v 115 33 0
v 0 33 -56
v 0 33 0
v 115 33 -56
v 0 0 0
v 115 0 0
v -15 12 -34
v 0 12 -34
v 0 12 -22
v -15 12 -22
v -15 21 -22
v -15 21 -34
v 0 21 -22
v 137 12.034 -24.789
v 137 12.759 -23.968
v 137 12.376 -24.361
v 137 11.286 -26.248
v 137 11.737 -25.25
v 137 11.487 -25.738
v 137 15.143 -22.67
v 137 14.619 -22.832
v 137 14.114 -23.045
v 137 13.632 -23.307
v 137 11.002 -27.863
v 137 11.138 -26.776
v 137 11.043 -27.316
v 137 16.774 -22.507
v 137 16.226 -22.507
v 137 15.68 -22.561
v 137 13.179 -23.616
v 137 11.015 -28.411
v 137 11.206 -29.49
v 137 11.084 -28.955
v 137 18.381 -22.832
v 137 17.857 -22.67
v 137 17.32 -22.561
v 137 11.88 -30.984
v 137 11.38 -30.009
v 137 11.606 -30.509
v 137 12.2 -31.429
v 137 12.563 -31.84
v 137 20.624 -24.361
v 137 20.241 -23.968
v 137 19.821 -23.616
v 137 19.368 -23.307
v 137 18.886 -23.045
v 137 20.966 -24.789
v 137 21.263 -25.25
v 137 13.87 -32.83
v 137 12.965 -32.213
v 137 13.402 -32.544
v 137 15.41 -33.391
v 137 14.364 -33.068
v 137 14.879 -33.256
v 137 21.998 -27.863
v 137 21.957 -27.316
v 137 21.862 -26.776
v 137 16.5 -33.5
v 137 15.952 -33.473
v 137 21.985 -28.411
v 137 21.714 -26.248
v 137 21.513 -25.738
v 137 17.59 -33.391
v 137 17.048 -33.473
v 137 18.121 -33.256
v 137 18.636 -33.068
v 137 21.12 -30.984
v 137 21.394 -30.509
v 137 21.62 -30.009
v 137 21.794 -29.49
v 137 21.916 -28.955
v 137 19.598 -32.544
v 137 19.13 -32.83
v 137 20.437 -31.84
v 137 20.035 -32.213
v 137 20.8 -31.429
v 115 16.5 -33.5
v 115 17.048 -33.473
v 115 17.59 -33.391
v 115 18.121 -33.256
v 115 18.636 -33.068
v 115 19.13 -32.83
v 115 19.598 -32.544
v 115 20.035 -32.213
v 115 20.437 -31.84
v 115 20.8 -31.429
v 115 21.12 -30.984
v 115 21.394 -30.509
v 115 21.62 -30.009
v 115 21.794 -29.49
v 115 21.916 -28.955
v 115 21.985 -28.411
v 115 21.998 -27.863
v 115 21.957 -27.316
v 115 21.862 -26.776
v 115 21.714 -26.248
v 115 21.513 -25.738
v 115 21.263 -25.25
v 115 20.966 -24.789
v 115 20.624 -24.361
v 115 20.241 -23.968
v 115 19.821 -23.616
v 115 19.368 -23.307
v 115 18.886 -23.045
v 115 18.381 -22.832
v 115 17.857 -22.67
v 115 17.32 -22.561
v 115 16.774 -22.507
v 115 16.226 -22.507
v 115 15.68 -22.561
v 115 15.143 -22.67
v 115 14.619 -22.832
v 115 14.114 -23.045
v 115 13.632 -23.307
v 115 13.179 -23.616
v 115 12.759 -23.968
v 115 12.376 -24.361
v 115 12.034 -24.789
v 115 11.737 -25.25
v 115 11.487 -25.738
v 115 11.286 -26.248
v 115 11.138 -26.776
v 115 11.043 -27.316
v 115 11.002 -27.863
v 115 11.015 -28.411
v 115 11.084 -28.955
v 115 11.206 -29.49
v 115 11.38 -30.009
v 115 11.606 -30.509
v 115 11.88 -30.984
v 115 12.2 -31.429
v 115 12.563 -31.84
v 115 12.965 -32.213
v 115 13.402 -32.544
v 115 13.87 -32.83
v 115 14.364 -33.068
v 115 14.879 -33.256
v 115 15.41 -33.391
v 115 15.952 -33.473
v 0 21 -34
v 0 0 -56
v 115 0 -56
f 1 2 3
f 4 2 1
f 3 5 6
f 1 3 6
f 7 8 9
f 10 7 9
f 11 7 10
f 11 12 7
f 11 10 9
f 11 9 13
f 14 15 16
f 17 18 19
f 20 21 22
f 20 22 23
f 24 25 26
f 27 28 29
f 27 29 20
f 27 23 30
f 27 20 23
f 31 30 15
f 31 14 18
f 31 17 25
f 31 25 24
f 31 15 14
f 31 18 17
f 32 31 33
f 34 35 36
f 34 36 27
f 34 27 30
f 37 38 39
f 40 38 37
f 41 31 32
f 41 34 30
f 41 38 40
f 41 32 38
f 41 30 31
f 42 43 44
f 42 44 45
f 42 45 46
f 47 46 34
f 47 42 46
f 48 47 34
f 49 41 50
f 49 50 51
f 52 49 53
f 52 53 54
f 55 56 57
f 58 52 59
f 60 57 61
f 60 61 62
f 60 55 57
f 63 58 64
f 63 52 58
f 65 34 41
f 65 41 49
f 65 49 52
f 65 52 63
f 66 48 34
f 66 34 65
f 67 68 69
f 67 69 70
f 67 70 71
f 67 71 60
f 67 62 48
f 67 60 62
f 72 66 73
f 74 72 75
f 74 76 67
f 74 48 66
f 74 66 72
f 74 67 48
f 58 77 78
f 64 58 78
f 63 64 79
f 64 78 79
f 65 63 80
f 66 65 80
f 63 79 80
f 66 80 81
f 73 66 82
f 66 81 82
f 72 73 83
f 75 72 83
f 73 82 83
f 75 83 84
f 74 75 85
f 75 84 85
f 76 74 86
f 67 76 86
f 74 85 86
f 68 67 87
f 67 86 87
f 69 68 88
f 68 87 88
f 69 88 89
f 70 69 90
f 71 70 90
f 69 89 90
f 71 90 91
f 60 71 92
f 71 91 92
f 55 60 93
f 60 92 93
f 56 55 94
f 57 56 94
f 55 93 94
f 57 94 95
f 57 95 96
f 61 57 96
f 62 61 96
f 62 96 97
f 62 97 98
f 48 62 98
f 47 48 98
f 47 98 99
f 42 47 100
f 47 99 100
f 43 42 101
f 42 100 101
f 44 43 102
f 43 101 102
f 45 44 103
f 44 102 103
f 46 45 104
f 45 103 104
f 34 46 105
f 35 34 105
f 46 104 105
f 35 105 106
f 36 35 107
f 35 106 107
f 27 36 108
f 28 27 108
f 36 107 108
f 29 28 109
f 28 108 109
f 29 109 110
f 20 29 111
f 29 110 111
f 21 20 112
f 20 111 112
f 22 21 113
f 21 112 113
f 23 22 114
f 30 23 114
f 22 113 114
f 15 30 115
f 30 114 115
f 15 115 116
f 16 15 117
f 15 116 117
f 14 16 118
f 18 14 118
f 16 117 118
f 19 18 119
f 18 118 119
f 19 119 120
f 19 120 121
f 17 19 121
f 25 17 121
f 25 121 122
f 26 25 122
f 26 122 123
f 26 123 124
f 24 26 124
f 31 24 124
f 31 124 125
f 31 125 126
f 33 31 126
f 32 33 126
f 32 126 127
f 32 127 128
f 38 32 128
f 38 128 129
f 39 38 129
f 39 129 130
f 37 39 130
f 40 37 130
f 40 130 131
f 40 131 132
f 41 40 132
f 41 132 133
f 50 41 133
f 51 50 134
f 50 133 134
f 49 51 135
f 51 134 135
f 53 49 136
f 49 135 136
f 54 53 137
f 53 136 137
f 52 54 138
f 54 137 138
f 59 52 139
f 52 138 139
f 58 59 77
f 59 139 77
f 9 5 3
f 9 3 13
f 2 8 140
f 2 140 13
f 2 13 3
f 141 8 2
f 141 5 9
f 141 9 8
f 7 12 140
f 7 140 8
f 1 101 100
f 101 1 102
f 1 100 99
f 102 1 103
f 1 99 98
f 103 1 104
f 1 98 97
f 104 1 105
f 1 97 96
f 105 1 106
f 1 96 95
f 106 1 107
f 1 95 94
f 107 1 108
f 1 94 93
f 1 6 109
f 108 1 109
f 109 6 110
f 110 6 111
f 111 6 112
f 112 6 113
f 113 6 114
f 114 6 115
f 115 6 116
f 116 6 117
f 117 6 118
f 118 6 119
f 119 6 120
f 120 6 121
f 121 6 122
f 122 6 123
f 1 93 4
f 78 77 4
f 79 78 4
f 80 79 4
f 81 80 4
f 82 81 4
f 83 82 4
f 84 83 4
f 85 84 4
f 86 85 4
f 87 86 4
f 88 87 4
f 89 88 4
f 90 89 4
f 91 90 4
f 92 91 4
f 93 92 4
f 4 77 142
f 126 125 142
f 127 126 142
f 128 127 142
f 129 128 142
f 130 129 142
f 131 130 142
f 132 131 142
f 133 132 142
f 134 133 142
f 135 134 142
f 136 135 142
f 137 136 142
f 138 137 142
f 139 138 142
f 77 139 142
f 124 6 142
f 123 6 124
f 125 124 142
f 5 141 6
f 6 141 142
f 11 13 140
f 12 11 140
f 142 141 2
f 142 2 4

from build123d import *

# Parameters (mm, degrees)
SZKIC1_W                    = 115
SZKIC1_H                    = 56
DODANIE_WYCI_GNI_CIE1_DEPTH = 33
SZKIC2_R                    = 5.5
DODANIE_WYCI_GNI_CIE2_DEPTH = 22
DODANIE_WYCI_GNI_CIE3_DEPTH = 15


with BuildPart() as part:
    # Szkic1 → Dodanie-wyciągnięcie1 (new body)
    with BuildSketch(Plane(origin=(0, 0, 0), x_dir=(1, 0, 0), z_dir=(0, 1, 0))):
        with Locations((57.5, 28)):
            Rectangle(SZKIC1_W, SZKIC1_H)
    extrude(amount=DODANIE_WYCI_GNI_CIE1_DEPTH)

    # Szkic2 → Dodanie-wyciągnięcie2 (add)
    with BuildSketch(Plane(origin=(115, 0, 0), x_dir=(0, 0, -1), z_dir=(1, 0, 0))):
        with Locations((28, 16.5)):
            Circle(SZKIC2_R)
    extrude(amount=DODANIE_WYCI_GNI_CIE2_DEPTH)

    # Szkic3 → Dodanie-wyciągnięcie3 (add)
    with BuildSketch(Plane.ZY):
        Polygon((-34, 16.5), (-34, 12), (-22, 12), (-22, 16.5), (-22, 21), (-34, 21), align=None)
    extrude(amount=DODANIE_WYCI_GNI_CIE3_DEPTH)


solid = part.part
